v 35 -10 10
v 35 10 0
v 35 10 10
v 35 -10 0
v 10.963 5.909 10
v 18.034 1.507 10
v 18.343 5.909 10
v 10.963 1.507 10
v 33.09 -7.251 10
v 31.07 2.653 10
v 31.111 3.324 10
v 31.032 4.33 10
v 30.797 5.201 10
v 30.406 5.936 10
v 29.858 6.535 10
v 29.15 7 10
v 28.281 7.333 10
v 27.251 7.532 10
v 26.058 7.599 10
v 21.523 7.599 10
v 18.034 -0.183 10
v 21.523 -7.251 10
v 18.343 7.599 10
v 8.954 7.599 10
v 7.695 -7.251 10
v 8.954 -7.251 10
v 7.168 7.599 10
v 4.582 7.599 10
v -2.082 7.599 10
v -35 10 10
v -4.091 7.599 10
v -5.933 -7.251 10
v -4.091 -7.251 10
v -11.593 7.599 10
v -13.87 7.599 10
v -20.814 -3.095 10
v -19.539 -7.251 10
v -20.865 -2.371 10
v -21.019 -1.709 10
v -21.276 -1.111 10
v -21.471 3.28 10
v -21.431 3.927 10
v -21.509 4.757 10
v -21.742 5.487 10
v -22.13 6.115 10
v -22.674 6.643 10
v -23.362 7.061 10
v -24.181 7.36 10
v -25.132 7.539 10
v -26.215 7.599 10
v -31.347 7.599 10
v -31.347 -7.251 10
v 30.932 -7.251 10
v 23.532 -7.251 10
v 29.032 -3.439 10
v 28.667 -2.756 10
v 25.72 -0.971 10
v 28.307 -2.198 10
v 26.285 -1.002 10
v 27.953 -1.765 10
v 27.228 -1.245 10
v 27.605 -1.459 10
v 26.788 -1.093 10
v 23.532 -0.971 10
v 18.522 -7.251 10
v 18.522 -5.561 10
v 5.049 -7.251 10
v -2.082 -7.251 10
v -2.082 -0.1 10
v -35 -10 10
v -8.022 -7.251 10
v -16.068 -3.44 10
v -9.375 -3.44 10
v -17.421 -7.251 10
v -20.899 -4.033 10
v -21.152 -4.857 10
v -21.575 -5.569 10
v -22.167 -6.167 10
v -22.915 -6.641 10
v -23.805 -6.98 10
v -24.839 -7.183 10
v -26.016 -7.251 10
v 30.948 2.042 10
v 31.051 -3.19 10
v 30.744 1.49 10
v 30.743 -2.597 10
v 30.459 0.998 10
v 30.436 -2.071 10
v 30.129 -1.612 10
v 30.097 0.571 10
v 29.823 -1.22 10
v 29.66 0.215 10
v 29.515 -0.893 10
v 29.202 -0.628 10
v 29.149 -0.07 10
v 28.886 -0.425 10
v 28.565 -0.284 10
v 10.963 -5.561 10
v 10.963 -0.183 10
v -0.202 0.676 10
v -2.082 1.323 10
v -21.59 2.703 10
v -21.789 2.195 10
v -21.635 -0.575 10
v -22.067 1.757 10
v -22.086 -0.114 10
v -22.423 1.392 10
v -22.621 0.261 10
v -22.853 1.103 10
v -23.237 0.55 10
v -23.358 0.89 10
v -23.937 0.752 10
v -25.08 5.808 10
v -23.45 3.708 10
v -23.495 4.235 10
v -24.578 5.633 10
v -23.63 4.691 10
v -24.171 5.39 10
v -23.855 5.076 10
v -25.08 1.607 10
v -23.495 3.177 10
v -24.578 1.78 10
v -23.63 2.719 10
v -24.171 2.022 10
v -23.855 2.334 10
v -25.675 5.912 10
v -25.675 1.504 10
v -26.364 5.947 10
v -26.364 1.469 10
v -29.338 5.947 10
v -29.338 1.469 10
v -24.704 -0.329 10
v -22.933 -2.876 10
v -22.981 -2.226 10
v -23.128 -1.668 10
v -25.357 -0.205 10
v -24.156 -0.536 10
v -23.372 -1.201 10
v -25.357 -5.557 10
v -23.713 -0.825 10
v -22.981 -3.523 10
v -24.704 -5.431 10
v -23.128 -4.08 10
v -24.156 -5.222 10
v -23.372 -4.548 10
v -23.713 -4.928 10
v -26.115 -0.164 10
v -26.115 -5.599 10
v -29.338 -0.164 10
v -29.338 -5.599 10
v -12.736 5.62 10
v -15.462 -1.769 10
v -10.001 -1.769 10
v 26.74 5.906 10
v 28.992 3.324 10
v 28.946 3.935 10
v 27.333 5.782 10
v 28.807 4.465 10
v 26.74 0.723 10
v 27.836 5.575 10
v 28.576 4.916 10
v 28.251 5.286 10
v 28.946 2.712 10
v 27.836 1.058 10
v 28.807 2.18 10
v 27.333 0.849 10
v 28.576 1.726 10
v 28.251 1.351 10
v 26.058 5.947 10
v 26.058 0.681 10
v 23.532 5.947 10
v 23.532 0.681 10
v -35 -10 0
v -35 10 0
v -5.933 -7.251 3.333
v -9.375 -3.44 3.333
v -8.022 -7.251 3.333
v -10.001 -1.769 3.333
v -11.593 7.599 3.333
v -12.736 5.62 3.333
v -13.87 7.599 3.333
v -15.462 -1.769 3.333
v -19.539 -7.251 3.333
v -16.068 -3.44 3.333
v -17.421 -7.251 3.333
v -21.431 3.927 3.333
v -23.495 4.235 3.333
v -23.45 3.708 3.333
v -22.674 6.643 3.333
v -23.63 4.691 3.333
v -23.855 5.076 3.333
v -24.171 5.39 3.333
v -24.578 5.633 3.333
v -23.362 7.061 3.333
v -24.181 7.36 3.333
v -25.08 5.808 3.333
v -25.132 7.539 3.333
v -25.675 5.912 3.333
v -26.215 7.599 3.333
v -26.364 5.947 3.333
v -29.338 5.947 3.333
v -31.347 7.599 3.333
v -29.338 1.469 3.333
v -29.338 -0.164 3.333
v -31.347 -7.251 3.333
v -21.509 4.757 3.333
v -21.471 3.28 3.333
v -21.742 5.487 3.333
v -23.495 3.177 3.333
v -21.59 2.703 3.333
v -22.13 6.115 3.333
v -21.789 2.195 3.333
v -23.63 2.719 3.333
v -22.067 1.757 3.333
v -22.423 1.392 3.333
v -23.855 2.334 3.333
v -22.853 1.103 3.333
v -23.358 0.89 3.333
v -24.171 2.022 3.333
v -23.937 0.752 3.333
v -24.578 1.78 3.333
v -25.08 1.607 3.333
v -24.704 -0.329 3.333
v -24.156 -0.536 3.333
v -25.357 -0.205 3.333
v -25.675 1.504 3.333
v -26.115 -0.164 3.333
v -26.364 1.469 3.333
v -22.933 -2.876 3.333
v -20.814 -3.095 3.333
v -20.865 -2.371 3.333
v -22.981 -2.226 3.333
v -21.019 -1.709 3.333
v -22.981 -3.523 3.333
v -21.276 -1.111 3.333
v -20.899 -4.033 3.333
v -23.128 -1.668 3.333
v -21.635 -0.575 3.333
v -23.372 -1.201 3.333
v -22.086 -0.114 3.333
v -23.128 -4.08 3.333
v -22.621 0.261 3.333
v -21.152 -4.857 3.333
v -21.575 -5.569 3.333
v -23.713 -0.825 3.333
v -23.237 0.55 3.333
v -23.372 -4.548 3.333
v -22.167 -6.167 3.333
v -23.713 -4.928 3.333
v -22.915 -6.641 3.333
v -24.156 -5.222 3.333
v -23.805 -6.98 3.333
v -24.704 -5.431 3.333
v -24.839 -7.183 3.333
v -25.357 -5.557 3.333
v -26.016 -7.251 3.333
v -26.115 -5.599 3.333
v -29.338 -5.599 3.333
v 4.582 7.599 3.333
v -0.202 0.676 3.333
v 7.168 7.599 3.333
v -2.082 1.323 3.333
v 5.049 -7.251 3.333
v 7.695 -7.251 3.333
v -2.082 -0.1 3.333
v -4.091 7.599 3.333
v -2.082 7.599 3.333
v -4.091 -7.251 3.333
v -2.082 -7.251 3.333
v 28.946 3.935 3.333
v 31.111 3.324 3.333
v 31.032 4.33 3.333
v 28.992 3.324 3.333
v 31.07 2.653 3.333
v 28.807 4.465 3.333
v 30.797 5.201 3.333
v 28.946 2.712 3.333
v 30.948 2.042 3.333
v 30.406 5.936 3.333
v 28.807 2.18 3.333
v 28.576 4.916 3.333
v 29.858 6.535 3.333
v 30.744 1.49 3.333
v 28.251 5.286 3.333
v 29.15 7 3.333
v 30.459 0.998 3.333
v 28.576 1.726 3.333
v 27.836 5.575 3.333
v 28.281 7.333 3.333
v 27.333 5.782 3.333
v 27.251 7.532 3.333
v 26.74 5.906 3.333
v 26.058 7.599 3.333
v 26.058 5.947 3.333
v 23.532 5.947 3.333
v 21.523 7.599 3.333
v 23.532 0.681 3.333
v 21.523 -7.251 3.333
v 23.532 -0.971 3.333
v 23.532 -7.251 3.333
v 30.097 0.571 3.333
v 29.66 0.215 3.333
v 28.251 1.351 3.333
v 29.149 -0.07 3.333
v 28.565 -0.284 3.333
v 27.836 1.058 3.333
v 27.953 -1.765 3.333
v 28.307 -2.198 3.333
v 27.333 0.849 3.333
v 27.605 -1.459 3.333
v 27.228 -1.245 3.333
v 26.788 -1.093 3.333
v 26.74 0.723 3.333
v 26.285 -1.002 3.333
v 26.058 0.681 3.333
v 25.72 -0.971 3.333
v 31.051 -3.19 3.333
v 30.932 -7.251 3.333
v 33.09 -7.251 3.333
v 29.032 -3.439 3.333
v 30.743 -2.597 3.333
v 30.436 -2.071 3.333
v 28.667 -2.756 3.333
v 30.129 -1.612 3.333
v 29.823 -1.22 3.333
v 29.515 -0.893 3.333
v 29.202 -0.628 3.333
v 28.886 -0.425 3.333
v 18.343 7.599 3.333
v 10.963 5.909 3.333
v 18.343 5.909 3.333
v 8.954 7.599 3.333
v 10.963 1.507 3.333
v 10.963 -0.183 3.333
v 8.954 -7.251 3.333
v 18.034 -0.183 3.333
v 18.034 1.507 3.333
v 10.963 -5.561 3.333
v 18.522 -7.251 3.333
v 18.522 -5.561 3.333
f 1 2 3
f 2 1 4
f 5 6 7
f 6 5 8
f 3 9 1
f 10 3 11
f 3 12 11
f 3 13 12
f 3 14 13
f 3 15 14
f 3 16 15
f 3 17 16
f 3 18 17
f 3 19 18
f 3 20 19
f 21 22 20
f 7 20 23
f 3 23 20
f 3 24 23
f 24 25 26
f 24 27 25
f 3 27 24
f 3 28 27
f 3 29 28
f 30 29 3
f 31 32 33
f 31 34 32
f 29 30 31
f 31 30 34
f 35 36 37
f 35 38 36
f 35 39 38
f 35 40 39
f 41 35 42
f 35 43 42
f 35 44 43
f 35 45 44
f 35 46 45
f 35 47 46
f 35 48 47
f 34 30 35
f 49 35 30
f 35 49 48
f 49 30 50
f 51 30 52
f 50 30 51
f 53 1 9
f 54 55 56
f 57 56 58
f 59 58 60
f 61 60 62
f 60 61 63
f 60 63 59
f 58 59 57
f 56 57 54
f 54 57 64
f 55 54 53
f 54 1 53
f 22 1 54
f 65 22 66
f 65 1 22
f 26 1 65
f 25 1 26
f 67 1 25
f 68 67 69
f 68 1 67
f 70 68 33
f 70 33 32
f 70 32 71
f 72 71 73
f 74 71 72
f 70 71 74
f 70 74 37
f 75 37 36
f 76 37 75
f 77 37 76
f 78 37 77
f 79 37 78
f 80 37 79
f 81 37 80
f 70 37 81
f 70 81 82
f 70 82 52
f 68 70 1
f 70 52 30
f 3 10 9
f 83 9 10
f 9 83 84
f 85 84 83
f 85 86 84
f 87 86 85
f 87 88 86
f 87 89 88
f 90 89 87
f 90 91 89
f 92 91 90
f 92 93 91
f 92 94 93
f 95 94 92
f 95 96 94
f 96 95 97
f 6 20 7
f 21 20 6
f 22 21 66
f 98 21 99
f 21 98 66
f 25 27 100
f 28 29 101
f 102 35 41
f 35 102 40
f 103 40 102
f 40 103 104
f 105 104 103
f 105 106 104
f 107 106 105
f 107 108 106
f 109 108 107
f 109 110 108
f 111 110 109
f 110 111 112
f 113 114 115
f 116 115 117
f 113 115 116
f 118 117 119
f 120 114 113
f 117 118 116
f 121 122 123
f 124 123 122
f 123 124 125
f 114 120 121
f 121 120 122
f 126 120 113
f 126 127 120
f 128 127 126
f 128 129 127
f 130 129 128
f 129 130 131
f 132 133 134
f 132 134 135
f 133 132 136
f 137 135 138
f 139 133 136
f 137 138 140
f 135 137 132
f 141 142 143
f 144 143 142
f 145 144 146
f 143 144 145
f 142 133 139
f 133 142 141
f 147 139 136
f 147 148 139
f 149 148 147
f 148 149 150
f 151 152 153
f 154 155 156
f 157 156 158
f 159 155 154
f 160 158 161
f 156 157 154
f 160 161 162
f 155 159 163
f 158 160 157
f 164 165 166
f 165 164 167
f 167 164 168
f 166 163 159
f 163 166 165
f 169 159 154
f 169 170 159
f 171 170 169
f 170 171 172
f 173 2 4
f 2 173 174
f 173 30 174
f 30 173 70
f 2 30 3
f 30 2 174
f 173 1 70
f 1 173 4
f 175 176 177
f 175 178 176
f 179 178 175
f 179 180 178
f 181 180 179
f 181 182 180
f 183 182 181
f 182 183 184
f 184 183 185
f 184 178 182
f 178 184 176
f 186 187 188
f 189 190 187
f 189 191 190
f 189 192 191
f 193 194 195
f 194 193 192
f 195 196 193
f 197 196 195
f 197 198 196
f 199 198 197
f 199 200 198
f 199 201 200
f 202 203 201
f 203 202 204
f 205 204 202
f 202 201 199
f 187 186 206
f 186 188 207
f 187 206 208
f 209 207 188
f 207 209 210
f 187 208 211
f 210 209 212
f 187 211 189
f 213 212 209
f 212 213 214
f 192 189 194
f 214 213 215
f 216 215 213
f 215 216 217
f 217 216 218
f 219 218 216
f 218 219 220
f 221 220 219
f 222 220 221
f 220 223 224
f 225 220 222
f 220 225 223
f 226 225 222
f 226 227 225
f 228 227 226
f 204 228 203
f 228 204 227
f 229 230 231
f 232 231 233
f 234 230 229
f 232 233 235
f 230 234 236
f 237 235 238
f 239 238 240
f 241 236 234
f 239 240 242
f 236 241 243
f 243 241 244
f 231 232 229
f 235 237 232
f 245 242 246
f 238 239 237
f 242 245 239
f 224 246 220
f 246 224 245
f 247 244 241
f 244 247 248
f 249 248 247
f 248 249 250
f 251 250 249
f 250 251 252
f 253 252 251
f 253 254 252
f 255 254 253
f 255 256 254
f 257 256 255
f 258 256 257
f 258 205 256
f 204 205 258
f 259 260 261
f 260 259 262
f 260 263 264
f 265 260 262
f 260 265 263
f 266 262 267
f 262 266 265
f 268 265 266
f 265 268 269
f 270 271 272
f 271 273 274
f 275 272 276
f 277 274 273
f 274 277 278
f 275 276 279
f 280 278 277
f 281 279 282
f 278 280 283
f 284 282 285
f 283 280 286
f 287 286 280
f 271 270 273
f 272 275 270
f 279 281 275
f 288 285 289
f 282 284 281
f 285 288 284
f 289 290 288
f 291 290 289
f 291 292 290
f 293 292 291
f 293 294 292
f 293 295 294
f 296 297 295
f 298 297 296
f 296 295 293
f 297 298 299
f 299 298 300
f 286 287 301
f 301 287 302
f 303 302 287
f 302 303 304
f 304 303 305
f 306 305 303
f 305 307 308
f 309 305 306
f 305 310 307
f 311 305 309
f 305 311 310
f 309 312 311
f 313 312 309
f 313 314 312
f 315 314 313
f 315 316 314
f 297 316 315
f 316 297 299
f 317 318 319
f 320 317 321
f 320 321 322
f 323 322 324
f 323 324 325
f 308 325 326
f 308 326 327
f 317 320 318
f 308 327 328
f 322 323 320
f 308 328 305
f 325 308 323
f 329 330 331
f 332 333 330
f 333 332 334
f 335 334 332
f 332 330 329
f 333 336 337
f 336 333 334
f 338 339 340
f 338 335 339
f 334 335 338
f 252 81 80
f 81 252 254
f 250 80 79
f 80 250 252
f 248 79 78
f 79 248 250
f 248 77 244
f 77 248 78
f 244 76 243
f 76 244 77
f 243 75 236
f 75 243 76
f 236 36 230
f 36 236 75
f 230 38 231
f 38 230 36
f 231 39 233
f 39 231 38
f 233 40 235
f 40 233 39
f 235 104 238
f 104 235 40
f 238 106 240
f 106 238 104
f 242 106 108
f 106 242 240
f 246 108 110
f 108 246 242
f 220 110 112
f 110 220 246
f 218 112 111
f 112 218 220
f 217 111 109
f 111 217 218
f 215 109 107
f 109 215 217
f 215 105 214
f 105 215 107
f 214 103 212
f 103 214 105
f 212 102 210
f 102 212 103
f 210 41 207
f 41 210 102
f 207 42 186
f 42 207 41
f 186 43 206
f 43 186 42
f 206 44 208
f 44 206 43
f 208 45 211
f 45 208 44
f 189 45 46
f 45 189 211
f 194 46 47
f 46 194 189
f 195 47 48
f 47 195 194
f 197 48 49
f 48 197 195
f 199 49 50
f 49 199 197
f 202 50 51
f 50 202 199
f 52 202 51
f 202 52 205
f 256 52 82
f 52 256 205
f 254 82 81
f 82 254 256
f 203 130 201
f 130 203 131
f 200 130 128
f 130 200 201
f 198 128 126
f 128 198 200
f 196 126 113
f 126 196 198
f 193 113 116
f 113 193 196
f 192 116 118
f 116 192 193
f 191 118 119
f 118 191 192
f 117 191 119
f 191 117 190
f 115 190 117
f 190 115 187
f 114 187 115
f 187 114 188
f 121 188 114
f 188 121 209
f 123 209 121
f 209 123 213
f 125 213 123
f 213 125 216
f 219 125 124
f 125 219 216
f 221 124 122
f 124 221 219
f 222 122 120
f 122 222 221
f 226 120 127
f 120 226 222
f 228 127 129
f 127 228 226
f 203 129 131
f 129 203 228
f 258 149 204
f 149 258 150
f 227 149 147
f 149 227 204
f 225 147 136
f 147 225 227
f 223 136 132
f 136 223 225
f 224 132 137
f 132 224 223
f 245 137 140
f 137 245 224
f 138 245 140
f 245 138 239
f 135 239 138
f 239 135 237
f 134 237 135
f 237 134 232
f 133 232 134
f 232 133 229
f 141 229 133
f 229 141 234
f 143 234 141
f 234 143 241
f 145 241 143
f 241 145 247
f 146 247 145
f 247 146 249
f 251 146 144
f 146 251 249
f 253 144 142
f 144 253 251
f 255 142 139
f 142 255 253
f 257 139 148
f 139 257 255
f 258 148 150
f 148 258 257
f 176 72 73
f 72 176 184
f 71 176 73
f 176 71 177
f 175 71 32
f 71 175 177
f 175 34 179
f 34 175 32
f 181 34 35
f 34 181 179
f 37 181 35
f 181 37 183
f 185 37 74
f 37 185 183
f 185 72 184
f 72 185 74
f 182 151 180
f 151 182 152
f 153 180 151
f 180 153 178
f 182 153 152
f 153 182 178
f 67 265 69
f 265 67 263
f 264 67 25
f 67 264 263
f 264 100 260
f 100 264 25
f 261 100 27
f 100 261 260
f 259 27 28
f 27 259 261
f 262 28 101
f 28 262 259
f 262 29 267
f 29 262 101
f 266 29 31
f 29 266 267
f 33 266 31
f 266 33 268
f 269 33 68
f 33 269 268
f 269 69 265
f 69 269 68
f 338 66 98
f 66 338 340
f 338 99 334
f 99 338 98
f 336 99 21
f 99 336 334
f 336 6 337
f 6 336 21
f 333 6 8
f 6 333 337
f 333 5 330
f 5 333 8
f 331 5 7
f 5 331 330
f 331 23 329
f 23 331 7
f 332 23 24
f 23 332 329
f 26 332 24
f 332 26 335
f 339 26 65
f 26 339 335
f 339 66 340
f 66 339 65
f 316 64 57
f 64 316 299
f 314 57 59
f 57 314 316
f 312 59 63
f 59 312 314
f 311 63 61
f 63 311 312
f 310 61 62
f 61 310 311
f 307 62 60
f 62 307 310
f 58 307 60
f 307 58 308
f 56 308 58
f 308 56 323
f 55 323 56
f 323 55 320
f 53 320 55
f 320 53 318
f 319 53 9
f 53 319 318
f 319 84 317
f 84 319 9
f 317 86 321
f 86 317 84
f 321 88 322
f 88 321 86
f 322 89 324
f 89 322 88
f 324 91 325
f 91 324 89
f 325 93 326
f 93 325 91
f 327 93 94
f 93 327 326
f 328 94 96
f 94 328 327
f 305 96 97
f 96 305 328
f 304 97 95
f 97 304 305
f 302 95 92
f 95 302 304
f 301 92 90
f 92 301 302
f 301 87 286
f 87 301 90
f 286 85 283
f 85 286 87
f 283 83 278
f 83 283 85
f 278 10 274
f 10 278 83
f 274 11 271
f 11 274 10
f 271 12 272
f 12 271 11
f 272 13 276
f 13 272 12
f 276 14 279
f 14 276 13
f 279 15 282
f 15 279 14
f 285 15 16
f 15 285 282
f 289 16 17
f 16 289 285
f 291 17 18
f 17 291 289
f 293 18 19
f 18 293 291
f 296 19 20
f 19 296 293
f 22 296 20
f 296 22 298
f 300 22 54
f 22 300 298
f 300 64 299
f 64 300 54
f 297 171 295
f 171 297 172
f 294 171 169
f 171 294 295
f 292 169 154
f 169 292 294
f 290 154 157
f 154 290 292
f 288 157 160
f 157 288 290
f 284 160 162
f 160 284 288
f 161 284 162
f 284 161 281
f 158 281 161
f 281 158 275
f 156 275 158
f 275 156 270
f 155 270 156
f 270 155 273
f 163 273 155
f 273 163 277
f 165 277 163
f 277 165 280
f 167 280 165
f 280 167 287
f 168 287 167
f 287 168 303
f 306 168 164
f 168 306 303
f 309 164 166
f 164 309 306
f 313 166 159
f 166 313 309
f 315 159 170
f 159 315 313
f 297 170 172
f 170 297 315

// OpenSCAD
// LetterBlock.scad - Basic usage of text() and linear_extrude()

// Module instantiation
LetterBlock("BAKER",20,70);

// Module definition.
// size=30 defines an optional parameter with a default value.
module LetterBlock(letter, height=30,width=0,depth=0) {
    width = width==0 ? height : width;
    depth = depth==0 ? height/2 : depth;
    size=height;
    difference() {
        translate([0,0,size/4]) cube([width,height,depth], center=true);
        translate([0,0,size/6]) {
            // convexity is needed for correct preview
            // since characters can be highly concave
            linear_extrude(height=size, convexity=4)
                text(letter, 
                     size=size*22/30,
                     font="Bitstream Vera Sans",
                     halign="center",
                     valign="center");
        }
    }
}

echo(version=version());
// Written by Marius Kintel <marius@kintel.net>
//
// To the extent possible under law, the author(s) have dedicated all
// copyright and related and neighboring rights to this software to the
// public domain worldwide. This software is distributed without any
// warranty.
//
// You should have received a copy of the CC0 Public Domain
// Dedication along with this software.
// If not, see <http://creativecommons.org/publicdomain/zero/1.0/>.
